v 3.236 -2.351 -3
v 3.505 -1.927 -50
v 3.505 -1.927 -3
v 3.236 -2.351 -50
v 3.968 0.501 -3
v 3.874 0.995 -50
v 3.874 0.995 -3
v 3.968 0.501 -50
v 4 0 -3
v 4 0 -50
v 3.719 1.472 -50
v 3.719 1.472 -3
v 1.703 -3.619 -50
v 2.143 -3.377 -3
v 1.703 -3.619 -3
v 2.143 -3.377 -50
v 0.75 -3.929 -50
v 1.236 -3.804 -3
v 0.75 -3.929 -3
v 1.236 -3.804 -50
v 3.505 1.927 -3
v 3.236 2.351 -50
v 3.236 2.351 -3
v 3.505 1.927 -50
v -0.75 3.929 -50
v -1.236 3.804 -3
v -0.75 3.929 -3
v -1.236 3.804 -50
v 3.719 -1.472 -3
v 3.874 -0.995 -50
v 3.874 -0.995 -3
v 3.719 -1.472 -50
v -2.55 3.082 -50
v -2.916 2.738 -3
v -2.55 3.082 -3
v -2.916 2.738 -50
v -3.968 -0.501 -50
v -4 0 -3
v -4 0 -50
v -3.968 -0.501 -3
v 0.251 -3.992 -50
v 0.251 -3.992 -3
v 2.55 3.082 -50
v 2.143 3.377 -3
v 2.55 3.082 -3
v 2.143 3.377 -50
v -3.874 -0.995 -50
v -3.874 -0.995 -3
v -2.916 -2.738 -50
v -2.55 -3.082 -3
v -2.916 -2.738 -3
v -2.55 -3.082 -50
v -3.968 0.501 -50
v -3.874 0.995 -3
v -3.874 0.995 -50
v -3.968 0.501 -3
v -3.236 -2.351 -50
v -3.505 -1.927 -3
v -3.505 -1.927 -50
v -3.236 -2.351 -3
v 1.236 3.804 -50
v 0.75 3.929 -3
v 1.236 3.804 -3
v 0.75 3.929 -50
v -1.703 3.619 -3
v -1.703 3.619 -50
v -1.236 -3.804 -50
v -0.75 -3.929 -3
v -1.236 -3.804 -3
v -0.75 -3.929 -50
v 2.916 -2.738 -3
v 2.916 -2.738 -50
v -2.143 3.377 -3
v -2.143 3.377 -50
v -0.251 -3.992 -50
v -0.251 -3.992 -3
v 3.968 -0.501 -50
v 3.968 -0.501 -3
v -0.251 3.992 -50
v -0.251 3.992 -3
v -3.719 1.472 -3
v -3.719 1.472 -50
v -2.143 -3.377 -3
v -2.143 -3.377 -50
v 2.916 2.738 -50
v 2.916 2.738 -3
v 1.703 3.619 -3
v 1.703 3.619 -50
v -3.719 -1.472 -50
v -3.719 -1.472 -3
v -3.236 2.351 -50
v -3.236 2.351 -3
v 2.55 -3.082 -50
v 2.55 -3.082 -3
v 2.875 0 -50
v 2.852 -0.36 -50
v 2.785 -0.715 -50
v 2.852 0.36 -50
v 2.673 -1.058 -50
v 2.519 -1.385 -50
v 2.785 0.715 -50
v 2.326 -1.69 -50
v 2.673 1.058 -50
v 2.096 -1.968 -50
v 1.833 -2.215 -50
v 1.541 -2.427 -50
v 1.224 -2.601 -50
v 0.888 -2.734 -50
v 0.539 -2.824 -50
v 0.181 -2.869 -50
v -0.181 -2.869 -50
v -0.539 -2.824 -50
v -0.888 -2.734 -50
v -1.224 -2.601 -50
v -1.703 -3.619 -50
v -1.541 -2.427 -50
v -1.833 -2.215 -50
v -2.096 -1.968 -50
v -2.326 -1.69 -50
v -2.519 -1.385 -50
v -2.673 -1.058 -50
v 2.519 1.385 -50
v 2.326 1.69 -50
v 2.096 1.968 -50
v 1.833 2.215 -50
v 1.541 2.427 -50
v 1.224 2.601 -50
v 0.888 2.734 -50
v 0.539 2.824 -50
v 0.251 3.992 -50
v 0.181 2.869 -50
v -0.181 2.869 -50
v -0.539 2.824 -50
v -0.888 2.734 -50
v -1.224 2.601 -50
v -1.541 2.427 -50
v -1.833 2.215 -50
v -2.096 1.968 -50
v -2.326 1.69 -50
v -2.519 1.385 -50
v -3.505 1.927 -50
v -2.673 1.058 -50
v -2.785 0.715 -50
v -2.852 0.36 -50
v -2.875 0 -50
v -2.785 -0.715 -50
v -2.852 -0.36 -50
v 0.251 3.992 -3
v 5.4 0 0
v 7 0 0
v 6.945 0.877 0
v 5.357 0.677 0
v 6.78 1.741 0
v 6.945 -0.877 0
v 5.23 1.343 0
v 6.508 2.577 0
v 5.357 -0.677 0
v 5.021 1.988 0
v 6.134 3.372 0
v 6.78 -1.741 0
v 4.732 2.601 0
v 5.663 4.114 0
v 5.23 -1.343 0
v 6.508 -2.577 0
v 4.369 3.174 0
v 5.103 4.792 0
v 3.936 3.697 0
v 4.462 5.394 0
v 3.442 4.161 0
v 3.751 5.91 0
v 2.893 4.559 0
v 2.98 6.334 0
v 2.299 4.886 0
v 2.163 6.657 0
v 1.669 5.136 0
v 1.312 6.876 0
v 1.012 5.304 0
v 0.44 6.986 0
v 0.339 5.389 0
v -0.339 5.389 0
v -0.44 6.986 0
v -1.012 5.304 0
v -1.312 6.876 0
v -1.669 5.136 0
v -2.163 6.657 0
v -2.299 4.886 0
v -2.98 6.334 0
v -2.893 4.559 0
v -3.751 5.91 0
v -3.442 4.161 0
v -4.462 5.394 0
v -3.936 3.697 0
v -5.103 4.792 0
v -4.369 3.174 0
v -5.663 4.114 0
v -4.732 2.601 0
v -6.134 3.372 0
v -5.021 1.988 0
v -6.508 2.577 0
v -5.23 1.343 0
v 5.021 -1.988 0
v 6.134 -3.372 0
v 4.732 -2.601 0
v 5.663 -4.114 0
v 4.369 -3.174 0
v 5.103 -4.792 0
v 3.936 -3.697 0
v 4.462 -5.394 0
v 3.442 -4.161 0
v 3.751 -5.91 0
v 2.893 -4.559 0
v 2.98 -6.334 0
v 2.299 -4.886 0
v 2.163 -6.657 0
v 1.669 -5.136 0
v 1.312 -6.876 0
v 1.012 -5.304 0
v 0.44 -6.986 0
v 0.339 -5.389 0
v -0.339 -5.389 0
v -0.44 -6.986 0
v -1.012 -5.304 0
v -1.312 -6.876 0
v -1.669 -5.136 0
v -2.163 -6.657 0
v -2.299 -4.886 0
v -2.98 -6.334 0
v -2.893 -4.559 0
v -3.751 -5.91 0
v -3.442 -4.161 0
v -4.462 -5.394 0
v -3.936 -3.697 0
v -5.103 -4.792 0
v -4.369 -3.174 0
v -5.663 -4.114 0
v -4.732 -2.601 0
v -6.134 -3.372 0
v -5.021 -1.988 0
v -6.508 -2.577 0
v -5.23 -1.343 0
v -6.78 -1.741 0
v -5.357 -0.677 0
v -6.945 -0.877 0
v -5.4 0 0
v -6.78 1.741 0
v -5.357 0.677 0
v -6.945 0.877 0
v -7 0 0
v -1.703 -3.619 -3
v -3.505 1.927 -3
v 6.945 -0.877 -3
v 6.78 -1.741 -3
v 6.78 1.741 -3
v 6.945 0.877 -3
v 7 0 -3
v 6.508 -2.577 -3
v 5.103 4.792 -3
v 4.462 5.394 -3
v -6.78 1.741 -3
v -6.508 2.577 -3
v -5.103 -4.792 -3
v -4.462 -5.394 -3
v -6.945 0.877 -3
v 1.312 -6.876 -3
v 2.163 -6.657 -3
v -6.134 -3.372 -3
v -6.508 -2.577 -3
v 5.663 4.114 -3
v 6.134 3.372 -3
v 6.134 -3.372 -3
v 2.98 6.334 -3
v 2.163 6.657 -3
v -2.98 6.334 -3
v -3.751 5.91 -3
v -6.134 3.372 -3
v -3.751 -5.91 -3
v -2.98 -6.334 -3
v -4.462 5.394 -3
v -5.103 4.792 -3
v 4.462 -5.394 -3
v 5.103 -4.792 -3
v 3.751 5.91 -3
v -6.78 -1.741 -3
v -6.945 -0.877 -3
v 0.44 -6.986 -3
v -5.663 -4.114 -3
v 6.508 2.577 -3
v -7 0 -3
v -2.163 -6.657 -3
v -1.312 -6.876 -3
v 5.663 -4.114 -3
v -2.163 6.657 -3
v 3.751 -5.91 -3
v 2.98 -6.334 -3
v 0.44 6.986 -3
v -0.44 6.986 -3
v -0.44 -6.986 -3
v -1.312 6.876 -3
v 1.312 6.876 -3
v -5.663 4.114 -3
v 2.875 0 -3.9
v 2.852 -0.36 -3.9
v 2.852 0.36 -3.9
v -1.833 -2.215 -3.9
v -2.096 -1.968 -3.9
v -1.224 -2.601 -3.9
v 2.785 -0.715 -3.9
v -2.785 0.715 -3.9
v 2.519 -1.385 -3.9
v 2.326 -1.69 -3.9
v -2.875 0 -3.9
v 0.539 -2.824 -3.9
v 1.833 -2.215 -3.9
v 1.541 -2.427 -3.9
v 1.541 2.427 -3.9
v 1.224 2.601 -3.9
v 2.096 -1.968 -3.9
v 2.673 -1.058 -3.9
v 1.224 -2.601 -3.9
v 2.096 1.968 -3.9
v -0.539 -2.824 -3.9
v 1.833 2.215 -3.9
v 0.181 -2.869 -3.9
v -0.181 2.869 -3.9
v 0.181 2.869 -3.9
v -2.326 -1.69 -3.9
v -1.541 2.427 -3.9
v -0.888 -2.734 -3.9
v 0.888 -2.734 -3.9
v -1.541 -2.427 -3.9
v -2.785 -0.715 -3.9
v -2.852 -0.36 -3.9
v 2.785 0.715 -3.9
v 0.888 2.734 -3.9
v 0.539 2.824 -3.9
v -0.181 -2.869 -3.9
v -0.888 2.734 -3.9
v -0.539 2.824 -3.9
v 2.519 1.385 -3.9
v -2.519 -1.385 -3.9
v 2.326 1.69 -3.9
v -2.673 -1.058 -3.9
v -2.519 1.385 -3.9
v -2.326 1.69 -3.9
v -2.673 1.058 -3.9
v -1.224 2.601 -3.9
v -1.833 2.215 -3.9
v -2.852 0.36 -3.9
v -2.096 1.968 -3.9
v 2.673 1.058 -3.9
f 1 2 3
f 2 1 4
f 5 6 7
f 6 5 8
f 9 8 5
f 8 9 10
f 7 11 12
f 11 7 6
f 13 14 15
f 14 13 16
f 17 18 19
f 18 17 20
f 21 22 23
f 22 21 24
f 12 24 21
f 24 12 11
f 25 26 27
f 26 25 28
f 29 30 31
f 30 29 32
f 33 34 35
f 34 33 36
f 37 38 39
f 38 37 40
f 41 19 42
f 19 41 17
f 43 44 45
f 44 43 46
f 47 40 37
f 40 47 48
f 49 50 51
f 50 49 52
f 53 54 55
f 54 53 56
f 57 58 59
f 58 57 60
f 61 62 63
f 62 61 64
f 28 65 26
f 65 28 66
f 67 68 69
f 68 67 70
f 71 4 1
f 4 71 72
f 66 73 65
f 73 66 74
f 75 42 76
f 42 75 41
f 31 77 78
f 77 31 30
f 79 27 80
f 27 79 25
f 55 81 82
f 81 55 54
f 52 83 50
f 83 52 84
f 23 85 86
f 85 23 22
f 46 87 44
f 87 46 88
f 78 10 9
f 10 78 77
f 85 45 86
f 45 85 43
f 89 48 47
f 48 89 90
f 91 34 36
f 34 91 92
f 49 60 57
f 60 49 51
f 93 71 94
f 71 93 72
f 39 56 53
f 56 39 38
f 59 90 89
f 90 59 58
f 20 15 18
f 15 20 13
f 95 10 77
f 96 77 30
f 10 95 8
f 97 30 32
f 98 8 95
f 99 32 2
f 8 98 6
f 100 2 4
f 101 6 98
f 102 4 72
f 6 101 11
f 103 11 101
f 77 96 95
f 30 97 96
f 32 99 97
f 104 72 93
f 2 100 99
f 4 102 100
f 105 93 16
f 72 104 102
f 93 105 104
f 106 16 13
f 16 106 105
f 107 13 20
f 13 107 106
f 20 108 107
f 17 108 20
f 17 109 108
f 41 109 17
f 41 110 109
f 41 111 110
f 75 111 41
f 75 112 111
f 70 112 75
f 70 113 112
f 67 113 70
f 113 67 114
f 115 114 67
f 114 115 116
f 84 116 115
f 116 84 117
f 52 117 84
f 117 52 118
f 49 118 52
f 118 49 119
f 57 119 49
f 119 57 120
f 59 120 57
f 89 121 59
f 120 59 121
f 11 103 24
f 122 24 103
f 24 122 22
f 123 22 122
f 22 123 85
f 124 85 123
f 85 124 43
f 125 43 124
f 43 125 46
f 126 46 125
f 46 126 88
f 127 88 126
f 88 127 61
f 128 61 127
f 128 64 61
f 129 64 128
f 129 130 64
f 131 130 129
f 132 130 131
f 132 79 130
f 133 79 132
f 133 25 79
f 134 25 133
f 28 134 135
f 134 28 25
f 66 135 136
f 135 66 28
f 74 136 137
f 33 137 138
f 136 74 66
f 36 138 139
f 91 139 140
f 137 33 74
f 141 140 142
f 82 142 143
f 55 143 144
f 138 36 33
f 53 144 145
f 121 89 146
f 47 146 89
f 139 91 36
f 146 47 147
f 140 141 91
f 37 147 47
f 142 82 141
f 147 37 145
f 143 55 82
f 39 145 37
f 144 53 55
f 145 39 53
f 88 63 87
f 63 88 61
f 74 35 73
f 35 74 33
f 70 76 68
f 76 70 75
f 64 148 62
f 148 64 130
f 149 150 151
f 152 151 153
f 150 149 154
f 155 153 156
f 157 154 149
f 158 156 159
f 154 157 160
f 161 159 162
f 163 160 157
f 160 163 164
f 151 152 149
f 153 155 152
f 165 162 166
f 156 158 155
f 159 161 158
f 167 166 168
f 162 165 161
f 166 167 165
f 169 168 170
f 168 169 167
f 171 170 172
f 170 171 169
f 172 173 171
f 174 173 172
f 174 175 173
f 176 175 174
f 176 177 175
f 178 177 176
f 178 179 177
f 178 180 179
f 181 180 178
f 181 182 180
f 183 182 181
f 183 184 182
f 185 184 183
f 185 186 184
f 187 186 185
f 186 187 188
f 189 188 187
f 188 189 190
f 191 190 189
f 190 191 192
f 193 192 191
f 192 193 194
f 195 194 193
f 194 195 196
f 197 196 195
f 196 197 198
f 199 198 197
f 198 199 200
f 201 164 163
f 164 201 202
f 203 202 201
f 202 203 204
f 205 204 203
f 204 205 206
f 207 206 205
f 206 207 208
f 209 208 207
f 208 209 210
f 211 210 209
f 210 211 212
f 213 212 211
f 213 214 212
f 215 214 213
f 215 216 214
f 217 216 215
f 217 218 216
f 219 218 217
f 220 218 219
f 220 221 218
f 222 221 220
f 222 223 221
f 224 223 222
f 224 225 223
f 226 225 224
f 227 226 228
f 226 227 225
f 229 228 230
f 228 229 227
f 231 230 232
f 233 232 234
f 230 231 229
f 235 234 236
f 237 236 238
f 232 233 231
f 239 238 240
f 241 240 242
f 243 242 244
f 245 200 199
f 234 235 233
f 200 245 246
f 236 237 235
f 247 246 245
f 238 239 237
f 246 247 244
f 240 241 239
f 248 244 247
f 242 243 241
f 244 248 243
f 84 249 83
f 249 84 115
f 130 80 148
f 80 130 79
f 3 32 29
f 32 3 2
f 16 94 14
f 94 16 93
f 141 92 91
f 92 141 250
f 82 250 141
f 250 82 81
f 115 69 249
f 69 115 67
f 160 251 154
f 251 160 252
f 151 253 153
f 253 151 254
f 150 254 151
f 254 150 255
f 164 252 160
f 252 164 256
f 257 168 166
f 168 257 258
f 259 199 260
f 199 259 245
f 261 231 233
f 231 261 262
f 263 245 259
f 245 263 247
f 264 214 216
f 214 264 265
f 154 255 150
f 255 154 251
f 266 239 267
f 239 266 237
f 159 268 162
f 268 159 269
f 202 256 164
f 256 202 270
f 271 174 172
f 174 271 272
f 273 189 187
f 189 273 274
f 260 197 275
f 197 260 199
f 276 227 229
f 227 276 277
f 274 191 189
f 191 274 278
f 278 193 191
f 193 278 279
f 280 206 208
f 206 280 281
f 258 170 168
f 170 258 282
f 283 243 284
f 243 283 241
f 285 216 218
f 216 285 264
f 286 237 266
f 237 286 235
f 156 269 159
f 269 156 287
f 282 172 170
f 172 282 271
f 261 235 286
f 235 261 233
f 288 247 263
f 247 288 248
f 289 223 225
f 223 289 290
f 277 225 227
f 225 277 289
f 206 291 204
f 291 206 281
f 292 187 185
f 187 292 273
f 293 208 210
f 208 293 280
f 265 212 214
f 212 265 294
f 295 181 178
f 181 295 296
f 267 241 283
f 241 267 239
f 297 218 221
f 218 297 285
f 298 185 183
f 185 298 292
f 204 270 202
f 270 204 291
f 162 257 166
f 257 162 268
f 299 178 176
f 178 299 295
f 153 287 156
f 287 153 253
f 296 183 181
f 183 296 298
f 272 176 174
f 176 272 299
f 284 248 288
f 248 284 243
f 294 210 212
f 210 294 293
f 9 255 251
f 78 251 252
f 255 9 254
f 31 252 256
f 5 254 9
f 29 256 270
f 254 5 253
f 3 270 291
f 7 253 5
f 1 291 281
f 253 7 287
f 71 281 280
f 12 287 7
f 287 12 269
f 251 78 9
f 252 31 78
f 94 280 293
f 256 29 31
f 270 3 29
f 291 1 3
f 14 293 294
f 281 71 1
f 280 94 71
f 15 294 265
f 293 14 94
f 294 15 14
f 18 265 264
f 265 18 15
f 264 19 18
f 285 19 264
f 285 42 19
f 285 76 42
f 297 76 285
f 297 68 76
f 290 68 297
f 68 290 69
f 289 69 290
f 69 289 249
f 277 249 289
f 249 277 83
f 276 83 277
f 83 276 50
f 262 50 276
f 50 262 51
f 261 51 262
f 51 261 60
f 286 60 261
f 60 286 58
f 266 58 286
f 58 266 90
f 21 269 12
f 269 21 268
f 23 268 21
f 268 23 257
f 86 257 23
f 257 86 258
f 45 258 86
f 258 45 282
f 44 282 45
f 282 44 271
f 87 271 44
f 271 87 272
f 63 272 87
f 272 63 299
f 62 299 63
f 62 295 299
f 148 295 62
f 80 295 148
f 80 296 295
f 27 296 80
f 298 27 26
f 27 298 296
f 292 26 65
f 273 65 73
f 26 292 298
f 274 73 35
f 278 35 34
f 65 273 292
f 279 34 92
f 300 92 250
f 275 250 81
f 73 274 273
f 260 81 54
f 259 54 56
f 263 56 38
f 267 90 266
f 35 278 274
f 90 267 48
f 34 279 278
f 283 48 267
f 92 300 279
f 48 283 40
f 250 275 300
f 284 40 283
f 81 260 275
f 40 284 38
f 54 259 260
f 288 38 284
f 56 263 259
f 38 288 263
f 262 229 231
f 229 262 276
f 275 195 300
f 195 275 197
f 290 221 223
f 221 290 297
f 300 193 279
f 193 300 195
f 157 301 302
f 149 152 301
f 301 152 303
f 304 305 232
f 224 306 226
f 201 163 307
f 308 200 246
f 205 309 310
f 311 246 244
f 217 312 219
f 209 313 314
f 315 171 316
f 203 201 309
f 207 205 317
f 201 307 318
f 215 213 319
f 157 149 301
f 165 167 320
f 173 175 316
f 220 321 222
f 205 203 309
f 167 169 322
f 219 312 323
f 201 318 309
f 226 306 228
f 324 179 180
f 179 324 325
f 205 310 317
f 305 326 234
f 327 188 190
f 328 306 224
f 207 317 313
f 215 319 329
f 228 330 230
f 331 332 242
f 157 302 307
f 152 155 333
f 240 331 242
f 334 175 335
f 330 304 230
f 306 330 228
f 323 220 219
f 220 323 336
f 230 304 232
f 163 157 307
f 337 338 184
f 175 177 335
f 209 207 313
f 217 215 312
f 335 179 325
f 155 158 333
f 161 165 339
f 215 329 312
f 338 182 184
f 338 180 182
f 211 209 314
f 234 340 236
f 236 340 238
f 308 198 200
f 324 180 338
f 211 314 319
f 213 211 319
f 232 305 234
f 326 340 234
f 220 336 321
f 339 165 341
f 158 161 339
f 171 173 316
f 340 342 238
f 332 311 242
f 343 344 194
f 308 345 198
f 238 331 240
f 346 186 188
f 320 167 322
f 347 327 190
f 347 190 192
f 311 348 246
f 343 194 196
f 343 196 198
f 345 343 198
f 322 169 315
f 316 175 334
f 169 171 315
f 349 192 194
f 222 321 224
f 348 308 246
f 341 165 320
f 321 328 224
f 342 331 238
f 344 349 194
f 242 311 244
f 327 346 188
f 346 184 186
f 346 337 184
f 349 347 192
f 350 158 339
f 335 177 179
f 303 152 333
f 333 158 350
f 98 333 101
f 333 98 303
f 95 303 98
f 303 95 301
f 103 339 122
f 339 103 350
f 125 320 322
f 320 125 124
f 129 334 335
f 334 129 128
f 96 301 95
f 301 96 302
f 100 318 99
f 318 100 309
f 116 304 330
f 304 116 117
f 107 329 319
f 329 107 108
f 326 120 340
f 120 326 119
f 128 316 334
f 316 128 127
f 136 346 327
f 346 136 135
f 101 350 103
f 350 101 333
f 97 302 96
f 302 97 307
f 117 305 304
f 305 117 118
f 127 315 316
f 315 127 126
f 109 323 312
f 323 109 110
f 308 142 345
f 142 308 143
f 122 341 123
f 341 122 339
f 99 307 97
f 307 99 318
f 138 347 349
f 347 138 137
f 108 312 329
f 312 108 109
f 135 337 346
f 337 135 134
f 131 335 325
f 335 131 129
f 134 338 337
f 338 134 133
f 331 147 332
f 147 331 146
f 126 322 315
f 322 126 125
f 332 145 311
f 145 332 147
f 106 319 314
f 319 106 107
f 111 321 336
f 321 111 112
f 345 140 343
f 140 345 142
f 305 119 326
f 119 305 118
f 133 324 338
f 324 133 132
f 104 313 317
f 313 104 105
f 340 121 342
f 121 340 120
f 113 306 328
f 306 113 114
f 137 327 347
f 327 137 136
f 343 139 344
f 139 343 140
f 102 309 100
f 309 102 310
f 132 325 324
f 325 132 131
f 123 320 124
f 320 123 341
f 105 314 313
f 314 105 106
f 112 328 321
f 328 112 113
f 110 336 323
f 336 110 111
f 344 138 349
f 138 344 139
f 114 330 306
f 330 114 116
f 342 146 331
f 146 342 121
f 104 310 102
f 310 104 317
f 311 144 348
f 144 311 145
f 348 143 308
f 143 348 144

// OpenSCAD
$fn = 50;


difference() {
	union() {
		translate(v = [0, 0, -50.0000000000]) {
			cylinder(h = 50, r = 4.0000000000);
		}
		translate(v = [0, 0, -3.0000000000]) {
			cylinder(h = 3, r = 7.0000000000);
		}
	}
	union() {
		translate(v = [0, 0, 0]) {
			rotate(a = [0, 0, 0]) {
				difference() {
					union() {
						#translate(v = [0, 0, -50.0000000000]) {
							cylinder(h = 50, r = 2.6000000000);
						}
						#translate(v = [0, 0, -3.9000000000]) {
							cylinder(h = 3.9000000000, r = 4.0000000000, r1 = 2.8750000000, r2 = 5.4000000000);
						}
						#translate(v = [0, 0, -50.0000000000]) {
							cylinder(h = 50, r = 2.8750000000);
						}
						#translate(v = [0, 0, -50.0000000000]) {
							cylinder(h = 50, r = 2.6000000000);
						}
					}
					union();
				}
			}
		}
	}
}
